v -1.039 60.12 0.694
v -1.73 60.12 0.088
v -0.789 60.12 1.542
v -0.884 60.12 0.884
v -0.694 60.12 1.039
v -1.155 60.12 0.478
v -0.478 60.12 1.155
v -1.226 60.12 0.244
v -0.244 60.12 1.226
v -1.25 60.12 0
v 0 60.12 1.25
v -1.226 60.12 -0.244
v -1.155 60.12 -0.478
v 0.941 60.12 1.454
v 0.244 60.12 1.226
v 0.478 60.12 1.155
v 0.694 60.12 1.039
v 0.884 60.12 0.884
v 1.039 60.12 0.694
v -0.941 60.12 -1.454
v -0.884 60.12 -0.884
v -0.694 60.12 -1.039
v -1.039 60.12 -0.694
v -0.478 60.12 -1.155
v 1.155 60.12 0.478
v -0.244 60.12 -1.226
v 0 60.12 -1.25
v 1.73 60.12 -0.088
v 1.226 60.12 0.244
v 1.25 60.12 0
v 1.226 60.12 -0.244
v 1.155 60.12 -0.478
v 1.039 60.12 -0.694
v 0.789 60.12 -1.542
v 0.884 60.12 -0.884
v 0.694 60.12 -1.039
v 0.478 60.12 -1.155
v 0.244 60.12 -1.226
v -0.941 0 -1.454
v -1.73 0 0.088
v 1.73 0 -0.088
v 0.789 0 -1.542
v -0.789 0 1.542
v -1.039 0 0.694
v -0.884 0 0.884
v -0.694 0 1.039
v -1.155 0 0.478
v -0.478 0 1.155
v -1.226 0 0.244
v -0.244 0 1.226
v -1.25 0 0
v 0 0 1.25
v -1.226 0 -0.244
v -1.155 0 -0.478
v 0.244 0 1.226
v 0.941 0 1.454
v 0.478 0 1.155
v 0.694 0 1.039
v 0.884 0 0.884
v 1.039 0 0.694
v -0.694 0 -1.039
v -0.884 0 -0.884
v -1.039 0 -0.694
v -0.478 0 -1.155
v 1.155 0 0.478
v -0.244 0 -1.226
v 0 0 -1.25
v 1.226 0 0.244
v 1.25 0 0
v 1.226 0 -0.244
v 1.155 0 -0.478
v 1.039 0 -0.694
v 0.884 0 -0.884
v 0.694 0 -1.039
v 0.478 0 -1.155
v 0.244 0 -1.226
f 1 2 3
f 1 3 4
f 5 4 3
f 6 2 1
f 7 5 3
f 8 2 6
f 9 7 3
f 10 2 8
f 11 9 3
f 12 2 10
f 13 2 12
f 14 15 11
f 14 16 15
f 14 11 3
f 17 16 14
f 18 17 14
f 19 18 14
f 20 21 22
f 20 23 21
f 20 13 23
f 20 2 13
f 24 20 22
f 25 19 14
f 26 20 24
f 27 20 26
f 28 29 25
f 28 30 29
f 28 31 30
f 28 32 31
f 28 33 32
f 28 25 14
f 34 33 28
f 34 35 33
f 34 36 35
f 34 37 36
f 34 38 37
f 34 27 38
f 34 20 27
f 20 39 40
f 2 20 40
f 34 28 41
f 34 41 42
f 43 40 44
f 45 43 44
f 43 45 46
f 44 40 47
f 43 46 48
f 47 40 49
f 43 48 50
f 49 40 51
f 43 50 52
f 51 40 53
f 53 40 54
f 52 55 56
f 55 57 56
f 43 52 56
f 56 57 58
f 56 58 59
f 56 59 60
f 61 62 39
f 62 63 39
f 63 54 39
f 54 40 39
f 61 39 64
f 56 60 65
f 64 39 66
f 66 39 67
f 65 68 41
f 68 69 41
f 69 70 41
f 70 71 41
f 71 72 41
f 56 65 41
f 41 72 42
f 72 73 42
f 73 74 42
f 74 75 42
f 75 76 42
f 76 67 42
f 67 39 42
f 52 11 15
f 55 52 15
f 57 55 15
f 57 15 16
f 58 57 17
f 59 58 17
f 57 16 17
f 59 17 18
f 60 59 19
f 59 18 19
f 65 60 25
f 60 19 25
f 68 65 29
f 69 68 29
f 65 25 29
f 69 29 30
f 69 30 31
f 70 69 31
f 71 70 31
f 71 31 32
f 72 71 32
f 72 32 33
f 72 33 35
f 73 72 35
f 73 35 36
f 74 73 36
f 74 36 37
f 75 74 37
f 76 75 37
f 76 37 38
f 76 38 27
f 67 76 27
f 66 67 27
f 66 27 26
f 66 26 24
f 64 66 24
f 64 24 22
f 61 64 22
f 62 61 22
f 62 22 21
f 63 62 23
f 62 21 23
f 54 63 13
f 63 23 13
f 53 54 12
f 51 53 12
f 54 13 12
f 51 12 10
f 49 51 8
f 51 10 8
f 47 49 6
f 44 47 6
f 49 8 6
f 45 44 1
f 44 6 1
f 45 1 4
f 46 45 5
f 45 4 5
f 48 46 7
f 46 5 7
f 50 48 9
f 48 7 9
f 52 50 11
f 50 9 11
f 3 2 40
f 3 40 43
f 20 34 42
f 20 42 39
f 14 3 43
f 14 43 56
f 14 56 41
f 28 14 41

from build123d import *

# Parameters (mm, degrees)
EXTRUDE_1_DEPTH     = 55.63
SKETCH_2_R          = 1.25
CUT_EXTRUDE_1_DEPTH = 55.63
EXTRUDE_START       = 4.490261
SKETCH_3_R          = 1.25
EXTRUDE_2_DEPTH     = 4.490261


with BuildPart() as part:
    # 草图1 → 凸台-拉伸1 (new body)
    with BuildSketch(Plane(origin=(0, 0, 0), x_dir=(1, 0, 0), z_dir=(0, 1, 0))):
        Polygon((0.940938815, -1.454178169), (1.729824643, 0.087787833), (0.788885828, 1.541966002), (-0.940938815, 1.454178169), (-1.729824643, -0.087787833), (-0.788885828, -1.541966002), align=None)
    extrude(amount=EXTRUDE_1_DEPTH)

    # 草图2 → 切除-拉伸1 (cut)
    with BuildSketch(Plane(origin=(0, 55.63, 0), x_dir=(1, 0, 0), z_dir=(0, 1, 0))):
        with Locations(Location((0, 0, 0), (0, 0, 270))):
            Circle(SKETCH_2_R)
    extrude(amount=-CUT_EXTRUDE_1_DEPTH, mode=Mode.SUBTRACT)

    # 草图3 → 凸台-拉伸2 (add)
    with BuildSketch(Plane(origin=(0, 55.63, 0), x_dir=(1, 0, 0), z_dir=(0, 1, 0)).offset(EXTRUDE_START)):
        Polygon((0.788885828, 1.541966002), (-0.940938815, 1.454178169), (-1.729824643, -0.087787833), (-0.788885828, -1.541966002), (0.940938815, -1.454178169), (1.729824643, 0.087787833), align=None)
        with Locations(Location((0, 0, 0), (0, 0, 270))):
            Circle(SKETCH_3_R, mode=Mode.SUBTRACT)
    extrude(amount=-EXTRUDE_2_DEPTH)


solid = part.part
